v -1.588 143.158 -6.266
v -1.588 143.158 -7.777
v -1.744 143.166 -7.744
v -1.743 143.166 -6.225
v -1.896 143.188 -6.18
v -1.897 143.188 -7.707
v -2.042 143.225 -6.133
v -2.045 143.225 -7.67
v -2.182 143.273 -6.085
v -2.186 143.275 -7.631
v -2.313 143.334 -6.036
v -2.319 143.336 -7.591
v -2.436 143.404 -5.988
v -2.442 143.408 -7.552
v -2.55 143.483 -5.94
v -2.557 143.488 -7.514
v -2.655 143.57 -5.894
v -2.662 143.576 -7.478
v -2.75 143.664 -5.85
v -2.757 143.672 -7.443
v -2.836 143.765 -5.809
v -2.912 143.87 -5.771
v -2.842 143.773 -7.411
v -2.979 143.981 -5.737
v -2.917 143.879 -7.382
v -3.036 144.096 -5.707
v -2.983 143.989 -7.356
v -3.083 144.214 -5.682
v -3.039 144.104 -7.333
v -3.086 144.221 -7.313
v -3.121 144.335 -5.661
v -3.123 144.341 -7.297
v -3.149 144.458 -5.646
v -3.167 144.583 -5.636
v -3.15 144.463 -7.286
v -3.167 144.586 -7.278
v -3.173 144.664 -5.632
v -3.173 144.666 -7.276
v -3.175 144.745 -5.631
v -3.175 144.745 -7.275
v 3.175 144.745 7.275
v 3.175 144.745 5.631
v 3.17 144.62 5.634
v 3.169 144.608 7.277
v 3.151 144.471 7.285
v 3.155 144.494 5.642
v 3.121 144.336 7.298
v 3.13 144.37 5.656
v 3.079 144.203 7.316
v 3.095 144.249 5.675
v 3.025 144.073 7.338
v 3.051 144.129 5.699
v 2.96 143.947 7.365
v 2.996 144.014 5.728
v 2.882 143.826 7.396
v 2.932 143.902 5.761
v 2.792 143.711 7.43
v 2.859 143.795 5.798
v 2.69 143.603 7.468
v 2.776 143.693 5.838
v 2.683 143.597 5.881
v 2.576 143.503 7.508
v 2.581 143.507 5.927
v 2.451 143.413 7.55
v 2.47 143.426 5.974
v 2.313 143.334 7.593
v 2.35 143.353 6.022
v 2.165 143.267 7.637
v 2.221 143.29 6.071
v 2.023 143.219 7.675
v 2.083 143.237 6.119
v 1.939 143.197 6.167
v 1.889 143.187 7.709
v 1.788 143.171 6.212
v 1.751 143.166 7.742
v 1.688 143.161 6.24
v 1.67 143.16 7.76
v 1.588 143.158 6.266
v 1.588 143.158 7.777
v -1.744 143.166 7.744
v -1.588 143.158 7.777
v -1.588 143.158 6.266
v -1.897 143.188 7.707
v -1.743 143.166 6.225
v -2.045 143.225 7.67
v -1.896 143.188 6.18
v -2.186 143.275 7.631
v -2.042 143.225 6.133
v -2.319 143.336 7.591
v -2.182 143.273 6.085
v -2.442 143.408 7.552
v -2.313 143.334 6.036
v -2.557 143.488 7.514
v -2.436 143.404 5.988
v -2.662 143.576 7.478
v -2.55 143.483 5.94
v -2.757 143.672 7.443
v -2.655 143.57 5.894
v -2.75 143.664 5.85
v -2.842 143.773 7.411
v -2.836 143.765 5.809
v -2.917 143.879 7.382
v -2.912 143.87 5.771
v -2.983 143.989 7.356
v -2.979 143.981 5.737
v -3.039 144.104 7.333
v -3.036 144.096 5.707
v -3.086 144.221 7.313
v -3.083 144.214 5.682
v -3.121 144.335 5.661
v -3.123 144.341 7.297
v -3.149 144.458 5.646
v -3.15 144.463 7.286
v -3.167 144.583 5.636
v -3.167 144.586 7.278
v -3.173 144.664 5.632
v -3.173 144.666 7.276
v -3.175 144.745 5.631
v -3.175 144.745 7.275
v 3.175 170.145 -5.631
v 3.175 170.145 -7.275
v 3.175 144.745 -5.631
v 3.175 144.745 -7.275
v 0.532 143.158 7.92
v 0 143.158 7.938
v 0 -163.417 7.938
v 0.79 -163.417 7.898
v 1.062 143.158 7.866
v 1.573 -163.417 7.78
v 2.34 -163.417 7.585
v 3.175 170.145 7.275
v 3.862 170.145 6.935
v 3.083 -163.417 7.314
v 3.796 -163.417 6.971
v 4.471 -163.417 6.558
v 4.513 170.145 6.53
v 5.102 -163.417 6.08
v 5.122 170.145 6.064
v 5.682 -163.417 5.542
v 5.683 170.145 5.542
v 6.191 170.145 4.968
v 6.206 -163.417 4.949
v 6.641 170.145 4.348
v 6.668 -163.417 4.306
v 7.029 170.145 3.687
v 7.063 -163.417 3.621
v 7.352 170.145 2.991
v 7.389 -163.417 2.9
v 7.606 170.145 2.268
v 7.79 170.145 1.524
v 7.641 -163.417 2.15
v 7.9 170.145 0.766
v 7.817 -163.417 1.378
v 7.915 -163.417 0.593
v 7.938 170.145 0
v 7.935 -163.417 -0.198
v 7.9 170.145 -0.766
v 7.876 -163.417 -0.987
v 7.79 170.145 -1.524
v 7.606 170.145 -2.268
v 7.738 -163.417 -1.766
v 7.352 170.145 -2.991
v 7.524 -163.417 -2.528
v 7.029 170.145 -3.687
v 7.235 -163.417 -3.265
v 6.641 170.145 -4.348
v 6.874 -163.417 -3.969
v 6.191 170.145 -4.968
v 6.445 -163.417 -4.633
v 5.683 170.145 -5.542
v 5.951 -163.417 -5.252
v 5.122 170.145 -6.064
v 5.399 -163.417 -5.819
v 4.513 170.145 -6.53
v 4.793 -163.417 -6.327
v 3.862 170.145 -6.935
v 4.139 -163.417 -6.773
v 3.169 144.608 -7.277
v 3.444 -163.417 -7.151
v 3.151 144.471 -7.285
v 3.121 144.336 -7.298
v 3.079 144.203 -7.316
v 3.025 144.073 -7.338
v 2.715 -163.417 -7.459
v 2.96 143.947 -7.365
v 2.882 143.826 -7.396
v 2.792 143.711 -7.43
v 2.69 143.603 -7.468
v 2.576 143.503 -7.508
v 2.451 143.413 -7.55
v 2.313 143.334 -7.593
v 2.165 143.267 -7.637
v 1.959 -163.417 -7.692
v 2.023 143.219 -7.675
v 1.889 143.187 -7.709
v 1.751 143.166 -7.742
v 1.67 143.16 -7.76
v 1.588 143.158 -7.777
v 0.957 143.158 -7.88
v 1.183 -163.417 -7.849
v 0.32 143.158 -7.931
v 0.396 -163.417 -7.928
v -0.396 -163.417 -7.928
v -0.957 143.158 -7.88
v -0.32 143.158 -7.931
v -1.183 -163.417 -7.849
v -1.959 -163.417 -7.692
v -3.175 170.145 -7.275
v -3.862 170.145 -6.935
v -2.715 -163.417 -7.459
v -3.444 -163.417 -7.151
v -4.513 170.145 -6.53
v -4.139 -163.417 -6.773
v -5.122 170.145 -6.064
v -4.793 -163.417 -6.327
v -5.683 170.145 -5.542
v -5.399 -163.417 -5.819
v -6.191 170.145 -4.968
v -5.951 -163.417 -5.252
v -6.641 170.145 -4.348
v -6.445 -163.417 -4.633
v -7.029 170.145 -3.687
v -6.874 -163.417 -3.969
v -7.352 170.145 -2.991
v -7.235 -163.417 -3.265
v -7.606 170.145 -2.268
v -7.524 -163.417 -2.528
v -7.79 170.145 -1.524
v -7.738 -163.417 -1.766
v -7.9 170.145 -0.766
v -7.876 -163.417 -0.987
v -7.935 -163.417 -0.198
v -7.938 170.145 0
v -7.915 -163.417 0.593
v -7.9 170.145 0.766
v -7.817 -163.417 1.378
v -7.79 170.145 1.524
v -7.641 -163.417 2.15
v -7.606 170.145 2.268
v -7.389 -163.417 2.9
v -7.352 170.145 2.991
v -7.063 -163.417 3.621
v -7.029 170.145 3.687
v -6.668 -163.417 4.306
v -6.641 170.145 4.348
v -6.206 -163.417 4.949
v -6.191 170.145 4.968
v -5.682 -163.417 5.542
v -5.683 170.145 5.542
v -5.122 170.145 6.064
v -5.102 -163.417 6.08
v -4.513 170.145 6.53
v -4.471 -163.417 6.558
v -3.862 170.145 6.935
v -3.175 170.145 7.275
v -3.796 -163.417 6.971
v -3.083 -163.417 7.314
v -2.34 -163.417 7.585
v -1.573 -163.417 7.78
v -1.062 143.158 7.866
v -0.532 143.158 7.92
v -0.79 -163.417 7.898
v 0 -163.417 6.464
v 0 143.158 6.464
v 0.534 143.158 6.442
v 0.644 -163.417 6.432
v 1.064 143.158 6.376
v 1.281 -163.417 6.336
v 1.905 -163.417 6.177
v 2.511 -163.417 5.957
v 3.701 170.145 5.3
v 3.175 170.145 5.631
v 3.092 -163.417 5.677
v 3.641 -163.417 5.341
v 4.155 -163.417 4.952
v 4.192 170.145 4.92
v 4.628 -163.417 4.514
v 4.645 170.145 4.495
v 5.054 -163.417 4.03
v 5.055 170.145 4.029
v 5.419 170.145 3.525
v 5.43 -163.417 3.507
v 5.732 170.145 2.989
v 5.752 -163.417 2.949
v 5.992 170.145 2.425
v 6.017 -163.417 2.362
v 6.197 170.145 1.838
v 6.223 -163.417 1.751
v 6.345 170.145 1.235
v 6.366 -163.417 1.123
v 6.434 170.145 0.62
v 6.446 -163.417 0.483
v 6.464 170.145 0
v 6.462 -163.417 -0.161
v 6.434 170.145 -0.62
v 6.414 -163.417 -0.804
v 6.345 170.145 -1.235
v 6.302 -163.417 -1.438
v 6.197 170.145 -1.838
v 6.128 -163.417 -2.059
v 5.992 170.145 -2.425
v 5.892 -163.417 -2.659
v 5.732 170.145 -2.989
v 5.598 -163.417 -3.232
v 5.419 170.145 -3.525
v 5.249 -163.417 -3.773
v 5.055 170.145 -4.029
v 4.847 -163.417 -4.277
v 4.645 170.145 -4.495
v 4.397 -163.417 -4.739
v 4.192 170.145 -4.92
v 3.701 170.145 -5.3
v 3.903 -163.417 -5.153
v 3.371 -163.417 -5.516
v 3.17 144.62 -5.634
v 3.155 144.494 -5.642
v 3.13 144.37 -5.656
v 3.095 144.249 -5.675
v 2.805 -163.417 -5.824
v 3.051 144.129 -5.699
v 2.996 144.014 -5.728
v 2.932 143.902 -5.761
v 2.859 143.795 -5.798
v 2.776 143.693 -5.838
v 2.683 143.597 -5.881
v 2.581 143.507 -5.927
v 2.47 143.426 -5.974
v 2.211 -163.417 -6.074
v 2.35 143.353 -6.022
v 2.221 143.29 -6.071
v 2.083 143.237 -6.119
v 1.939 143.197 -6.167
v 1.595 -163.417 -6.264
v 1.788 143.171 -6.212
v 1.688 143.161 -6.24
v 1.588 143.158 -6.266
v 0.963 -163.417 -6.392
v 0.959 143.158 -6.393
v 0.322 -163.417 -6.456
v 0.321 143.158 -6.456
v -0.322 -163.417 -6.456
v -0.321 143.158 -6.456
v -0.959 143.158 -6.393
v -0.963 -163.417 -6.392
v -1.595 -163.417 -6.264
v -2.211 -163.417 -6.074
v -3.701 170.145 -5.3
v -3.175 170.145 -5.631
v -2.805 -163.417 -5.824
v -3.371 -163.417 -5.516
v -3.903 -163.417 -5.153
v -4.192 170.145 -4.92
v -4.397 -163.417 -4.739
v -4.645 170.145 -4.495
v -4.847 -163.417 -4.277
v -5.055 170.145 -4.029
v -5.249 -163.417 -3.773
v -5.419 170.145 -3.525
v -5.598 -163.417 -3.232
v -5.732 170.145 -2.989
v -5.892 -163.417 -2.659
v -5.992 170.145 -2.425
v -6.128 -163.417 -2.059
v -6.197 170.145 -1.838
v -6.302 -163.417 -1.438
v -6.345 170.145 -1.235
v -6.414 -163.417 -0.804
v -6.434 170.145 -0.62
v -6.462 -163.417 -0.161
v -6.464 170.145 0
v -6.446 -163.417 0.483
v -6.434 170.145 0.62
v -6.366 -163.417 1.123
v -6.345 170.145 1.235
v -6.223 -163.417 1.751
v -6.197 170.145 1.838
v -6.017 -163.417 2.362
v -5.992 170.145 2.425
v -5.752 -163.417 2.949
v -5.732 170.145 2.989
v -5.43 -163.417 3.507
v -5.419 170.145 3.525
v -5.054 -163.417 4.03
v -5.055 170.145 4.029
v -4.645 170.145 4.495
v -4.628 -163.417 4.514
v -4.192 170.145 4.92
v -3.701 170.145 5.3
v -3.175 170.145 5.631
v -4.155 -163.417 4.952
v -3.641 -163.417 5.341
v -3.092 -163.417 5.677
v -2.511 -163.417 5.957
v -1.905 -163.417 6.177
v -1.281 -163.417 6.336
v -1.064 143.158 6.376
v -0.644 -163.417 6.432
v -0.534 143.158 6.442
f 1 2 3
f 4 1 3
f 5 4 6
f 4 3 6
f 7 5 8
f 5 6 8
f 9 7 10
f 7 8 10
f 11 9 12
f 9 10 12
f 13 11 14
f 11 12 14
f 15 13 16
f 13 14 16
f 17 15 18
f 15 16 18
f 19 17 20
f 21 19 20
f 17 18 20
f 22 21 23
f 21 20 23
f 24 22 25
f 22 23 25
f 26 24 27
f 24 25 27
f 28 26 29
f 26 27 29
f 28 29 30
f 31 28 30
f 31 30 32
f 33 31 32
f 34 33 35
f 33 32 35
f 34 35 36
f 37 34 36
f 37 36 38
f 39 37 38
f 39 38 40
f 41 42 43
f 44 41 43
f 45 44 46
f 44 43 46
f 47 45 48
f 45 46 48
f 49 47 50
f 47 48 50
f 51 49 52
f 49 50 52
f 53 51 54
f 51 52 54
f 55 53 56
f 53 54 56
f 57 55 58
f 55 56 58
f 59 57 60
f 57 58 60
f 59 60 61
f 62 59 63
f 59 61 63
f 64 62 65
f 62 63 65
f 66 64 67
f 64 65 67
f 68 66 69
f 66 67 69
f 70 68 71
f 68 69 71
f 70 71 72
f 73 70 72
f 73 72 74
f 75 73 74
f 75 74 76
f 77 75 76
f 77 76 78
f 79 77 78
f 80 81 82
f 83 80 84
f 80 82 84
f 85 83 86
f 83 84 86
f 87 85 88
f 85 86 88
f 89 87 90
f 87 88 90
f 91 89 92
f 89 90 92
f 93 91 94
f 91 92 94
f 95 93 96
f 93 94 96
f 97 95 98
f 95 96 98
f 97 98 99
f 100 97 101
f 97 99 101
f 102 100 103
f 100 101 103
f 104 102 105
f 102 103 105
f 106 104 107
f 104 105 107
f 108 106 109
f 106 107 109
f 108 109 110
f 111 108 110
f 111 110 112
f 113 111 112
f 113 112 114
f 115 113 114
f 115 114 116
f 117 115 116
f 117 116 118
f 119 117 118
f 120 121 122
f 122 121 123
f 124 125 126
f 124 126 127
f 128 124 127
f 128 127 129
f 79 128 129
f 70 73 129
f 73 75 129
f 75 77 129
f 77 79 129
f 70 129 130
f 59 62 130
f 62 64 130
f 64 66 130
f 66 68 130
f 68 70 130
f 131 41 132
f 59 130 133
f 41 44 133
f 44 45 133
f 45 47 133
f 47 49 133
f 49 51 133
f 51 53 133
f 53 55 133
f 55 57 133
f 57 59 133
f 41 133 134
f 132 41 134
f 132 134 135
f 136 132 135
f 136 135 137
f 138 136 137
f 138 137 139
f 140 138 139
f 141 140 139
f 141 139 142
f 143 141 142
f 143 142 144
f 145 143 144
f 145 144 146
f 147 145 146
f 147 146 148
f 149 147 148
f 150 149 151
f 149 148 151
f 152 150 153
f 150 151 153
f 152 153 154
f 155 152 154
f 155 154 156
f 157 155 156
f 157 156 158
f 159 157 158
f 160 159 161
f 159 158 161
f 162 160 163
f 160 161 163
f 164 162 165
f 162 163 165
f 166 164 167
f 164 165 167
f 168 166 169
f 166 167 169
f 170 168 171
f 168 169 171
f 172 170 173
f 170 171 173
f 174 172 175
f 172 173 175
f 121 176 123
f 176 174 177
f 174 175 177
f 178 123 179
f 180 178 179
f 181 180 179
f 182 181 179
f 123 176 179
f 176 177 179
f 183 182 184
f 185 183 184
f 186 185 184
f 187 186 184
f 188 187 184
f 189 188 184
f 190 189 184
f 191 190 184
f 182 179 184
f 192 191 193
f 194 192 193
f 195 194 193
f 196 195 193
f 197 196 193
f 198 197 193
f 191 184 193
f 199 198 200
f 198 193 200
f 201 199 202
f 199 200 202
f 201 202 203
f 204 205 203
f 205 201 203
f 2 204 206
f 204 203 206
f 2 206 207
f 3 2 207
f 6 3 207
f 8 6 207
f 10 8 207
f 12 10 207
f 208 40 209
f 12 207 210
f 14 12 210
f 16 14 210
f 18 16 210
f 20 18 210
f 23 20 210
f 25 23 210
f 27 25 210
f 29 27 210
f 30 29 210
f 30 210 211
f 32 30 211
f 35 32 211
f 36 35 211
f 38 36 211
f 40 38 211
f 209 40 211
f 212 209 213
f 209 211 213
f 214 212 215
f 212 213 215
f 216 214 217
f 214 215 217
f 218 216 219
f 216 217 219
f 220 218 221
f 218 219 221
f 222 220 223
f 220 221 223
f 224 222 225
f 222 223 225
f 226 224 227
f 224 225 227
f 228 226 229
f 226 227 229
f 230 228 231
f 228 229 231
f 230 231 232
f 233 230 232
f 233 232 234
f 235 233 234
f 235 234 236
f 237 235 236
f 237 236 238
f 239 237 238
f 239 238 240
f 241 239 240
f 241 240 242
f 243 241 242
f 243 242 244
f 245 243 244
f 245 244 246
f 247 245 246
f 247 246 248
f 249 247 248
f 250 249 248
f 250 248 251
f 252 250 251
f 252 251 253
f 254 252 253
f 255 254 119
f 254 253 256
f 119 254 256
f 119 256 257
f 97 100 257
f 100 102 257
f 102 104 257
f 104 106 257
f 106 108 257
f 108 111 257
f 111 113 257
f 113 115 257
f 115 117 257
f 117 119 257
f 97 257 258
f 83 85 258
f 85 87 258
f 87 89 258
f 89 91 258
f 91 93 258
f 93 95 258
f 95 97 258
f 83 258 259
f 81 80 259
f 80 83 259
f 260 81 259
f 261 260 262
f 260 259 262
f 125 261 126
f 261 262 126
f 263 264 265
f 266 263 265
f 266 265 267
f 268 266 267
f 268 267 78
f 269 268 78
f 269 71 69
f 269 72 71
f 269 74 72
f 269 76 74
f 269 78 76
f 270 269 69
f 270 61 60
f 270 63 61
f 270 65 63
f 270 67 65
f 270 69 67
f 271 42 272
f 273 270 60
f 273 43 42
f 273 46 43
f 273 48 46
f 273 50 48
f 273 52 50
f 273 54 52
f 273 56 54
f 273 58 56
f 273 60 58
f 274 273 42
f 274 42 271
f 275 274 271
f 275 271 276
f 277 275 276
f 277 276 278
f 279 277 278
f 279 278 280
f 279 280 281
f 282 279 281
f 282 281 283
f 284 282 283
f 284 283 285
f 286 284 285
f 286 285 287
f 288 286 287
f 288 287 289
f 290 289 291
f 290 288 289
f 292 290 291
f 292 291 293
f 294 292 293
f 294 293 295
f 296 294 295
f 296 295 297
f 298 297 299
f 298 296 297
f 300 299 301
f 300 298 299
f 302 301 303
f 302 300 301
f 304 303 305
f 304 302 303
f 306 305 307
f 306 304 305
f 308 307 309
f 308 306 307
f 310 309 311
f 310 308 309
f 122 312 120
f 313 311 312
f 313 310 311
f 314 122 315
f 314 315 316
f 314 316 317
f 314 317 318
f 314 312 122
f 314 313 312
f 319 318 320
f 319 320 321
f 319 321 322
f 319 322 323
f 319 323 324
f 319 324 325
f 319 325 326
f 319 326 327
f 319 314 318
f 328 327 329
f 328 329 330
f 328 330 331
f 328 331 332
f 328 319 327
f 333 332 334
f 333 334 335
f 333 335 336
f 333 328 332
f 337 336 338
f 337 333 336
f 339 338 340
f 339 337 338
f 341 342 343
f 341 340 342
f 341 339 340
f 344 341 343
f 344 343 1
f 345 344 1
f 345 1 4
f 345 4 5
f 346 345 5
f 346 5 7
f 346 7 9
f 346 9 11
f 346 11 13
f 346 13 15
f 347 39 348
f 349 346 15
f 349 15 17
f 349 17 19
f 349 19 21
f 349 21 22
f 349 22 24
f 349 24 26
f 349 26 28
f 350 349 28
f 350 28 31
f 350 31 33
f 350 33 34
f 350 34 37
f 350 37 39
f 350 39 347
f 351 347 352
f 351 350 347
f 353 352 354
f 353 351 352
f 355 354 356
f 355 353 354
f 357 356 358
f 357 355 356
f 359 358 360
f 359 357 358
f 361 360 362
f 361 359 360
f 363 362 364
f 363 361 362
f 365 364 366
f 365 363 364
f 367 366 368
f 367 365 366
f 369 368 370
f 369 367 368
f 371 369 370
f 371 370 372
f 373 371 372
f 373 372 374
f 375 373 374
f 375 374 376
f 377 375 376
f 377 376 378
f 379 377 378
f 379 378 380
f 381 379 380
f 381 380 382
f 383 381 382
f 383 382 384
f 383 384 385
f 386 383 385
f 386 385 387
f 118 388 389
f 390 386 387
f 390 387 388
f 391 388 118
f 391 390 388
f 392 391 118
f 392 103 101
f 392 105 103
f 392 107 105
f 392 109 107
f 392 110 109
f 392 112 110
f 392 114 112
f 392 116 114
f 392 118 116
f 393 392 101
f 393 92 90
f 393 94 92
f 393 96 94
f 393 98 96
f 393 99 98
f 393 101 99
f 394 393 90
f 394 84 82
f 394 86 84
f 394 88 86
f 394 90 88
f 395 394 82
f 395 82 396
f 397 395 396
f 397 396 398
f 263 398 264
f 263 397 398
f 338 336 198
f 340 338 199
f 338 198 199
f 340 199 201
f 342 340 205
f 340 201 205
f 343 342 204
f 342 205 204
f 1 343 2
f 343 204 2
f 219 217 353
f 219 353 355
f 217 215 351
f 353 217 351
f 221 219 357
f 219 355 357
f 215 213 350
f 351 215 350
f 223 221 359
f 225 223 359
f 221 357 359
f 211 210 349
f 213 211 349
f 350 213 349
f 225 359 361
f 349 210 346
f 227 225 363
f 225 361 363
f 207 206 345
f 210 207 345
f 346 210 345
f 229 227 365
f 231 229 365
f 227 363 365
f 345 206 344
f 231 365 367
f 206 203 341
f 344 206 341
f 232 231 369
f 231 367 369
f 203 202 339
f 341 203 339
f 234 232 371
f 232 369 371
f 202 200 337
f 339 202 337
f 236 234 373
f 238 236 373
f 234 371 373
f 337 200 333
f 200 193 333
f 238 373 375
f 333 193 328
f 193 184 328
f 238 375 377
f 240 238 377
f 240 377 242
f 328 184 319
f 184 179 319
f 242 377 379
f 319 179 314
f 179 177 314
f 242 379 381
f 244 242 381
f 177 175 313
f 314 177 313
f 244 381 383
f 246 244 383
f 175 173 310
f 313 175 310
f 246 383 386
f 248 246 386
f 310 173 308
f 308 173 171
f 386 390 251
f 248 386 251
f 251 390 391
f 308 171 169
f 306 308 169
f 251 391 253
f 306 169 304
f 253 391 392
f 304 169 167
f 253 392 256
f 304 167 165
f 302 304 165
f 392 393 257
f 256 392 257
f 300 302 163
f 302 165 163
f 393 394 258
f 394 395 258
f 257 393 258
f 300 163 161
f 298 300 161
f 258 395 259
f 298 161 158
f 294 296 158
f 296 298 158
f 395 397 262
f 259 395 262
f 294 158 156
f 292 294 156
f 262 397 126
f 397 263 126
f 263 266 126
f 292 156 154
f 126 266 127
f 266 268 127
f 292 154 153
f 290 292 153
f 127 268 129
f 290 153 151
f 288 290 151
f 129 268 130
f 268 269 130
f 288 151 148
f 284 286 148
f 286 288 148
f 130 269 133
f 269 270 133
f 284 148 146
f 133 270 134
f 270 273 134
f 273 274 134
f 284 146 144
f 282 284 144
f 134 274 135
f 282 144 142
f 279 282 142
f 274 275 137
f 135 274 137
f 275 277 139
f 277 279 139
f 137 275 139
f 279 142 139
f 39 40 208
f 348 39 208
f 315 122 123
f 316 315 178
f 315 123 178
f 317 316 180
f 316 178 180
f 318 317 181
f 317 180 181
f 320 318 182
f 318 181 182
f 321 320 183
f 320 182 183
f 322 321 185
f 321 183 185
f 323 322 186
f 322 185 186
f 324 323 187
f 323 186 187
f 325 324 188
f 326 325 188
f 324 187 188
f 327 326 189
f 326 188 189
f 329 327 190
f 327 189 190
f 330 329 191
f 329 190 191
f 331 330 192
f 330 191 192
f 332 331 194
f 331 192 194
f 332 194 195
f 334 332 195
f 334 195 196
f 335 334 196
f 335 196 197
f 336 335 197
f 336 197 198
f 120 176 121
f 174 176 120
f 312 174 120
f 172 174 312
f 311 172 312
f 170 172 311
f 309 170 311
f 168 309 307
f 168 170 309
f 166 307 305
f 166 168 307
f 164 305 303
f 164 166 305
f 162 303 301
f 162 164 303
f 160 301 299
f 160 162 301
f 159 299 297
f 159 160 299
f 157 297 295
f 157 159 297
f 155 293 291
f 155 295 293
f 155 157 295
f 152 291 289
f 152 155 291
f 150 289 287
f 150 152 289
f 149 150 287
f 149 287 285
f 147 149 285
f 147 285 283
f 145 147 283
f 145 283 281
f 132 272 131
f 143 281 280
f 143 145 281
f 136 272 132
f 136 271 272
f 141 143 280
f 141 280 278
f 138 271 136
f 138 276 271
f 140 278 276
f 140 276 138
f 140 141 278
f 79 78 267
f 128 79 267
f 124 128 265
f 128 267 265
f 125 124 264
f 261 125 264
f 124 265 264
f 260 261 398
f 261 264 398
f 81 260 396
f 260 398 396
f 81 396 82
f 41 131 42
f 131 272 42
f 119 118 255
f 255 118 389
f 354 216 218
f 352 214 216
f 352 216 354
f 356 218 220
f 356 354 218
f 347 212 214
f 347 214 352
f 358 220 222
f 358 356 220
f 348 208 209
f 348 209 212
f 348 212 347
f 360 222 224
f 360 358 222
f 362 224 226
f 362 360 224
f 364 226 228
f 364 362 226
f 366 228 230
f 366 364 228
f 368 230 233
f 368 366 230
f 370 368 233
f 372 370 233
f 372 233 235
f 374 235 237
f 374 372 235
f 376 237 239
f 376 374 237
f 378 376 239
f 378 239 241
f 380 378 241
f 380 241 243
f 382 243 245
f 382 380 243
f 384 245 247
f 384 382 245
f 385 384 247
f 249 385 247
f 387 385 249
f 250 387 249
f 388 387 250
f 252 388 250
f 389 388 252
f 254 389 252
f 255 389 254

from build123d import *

# Parameters (mm, degrees)
BOSS_EXTRUDE1_START     = -163.416678
SKETCH1_R               = 7.9375
SKETCH1_R_2             = 6.4643
BOSS_EXTRUDE1_DEPTH     = 333.562160318
CUT_EXTRUDE1_DEPTH      = 171.515374573
CUT_EXTRUDE1_DEPTH_BACK = 171.515374573


with BuildPart() as part:
    # Sketch1 → Boss-Extrude1 (new body)
    with BuildSketch(Plane(origin=(0, 0, 0), x_dir=(1, 0, 0), z_dir=(0, 1, 0)).offset(BOSS_EXTRUDE1_START)):
        with Locations(Location((0, 0, 0), (0, 0, 270))):
            Circle(SKETCH1_R)
        with Locations(Location((0, 0, 0), (0, 0, 270))):
            Circle(SKETCH1_R_2, mode=Mode.SUBTRACT)
    extrude(amount=BOSS_EXTRUDE1_DEPTH)

    # Sketch2 → Cut-Extrude1 (cut, two sides: drawn at the far end of the back side and taken through both)
    with BuildSketch(Plane.XY.offset(-CUT_EXTRUDE1_DEPTH_BACK)):
        with BuildLine():
            Line((-3.175, 170.145482762), (3.175, 170.145482762))
            Line((3.175, 170.145482762), (3.175, 144.745482762))
            ThreePointArc((3.175, 144.745482762), (2.710032015, 143.622950747), (1.5875, 143.157982762))
            Line((1.5875, 143.157982762), (-1.5875, 143.157982762))
            ThreePointArc((-1.5875, 143.157982762), (-2.710032015, 143.622950747), (-3.175, 144.745482762))
            Line((-3.175, 144.745482762), (-3.175, 170.145482762))
        make_face()
    extrude(amount=CUT_EXTRUDE1_DEPTH + CUT_EXTRUDE1_DEPTH_BACK, mode=Mode.SUBTRACT)


solid = part.part
